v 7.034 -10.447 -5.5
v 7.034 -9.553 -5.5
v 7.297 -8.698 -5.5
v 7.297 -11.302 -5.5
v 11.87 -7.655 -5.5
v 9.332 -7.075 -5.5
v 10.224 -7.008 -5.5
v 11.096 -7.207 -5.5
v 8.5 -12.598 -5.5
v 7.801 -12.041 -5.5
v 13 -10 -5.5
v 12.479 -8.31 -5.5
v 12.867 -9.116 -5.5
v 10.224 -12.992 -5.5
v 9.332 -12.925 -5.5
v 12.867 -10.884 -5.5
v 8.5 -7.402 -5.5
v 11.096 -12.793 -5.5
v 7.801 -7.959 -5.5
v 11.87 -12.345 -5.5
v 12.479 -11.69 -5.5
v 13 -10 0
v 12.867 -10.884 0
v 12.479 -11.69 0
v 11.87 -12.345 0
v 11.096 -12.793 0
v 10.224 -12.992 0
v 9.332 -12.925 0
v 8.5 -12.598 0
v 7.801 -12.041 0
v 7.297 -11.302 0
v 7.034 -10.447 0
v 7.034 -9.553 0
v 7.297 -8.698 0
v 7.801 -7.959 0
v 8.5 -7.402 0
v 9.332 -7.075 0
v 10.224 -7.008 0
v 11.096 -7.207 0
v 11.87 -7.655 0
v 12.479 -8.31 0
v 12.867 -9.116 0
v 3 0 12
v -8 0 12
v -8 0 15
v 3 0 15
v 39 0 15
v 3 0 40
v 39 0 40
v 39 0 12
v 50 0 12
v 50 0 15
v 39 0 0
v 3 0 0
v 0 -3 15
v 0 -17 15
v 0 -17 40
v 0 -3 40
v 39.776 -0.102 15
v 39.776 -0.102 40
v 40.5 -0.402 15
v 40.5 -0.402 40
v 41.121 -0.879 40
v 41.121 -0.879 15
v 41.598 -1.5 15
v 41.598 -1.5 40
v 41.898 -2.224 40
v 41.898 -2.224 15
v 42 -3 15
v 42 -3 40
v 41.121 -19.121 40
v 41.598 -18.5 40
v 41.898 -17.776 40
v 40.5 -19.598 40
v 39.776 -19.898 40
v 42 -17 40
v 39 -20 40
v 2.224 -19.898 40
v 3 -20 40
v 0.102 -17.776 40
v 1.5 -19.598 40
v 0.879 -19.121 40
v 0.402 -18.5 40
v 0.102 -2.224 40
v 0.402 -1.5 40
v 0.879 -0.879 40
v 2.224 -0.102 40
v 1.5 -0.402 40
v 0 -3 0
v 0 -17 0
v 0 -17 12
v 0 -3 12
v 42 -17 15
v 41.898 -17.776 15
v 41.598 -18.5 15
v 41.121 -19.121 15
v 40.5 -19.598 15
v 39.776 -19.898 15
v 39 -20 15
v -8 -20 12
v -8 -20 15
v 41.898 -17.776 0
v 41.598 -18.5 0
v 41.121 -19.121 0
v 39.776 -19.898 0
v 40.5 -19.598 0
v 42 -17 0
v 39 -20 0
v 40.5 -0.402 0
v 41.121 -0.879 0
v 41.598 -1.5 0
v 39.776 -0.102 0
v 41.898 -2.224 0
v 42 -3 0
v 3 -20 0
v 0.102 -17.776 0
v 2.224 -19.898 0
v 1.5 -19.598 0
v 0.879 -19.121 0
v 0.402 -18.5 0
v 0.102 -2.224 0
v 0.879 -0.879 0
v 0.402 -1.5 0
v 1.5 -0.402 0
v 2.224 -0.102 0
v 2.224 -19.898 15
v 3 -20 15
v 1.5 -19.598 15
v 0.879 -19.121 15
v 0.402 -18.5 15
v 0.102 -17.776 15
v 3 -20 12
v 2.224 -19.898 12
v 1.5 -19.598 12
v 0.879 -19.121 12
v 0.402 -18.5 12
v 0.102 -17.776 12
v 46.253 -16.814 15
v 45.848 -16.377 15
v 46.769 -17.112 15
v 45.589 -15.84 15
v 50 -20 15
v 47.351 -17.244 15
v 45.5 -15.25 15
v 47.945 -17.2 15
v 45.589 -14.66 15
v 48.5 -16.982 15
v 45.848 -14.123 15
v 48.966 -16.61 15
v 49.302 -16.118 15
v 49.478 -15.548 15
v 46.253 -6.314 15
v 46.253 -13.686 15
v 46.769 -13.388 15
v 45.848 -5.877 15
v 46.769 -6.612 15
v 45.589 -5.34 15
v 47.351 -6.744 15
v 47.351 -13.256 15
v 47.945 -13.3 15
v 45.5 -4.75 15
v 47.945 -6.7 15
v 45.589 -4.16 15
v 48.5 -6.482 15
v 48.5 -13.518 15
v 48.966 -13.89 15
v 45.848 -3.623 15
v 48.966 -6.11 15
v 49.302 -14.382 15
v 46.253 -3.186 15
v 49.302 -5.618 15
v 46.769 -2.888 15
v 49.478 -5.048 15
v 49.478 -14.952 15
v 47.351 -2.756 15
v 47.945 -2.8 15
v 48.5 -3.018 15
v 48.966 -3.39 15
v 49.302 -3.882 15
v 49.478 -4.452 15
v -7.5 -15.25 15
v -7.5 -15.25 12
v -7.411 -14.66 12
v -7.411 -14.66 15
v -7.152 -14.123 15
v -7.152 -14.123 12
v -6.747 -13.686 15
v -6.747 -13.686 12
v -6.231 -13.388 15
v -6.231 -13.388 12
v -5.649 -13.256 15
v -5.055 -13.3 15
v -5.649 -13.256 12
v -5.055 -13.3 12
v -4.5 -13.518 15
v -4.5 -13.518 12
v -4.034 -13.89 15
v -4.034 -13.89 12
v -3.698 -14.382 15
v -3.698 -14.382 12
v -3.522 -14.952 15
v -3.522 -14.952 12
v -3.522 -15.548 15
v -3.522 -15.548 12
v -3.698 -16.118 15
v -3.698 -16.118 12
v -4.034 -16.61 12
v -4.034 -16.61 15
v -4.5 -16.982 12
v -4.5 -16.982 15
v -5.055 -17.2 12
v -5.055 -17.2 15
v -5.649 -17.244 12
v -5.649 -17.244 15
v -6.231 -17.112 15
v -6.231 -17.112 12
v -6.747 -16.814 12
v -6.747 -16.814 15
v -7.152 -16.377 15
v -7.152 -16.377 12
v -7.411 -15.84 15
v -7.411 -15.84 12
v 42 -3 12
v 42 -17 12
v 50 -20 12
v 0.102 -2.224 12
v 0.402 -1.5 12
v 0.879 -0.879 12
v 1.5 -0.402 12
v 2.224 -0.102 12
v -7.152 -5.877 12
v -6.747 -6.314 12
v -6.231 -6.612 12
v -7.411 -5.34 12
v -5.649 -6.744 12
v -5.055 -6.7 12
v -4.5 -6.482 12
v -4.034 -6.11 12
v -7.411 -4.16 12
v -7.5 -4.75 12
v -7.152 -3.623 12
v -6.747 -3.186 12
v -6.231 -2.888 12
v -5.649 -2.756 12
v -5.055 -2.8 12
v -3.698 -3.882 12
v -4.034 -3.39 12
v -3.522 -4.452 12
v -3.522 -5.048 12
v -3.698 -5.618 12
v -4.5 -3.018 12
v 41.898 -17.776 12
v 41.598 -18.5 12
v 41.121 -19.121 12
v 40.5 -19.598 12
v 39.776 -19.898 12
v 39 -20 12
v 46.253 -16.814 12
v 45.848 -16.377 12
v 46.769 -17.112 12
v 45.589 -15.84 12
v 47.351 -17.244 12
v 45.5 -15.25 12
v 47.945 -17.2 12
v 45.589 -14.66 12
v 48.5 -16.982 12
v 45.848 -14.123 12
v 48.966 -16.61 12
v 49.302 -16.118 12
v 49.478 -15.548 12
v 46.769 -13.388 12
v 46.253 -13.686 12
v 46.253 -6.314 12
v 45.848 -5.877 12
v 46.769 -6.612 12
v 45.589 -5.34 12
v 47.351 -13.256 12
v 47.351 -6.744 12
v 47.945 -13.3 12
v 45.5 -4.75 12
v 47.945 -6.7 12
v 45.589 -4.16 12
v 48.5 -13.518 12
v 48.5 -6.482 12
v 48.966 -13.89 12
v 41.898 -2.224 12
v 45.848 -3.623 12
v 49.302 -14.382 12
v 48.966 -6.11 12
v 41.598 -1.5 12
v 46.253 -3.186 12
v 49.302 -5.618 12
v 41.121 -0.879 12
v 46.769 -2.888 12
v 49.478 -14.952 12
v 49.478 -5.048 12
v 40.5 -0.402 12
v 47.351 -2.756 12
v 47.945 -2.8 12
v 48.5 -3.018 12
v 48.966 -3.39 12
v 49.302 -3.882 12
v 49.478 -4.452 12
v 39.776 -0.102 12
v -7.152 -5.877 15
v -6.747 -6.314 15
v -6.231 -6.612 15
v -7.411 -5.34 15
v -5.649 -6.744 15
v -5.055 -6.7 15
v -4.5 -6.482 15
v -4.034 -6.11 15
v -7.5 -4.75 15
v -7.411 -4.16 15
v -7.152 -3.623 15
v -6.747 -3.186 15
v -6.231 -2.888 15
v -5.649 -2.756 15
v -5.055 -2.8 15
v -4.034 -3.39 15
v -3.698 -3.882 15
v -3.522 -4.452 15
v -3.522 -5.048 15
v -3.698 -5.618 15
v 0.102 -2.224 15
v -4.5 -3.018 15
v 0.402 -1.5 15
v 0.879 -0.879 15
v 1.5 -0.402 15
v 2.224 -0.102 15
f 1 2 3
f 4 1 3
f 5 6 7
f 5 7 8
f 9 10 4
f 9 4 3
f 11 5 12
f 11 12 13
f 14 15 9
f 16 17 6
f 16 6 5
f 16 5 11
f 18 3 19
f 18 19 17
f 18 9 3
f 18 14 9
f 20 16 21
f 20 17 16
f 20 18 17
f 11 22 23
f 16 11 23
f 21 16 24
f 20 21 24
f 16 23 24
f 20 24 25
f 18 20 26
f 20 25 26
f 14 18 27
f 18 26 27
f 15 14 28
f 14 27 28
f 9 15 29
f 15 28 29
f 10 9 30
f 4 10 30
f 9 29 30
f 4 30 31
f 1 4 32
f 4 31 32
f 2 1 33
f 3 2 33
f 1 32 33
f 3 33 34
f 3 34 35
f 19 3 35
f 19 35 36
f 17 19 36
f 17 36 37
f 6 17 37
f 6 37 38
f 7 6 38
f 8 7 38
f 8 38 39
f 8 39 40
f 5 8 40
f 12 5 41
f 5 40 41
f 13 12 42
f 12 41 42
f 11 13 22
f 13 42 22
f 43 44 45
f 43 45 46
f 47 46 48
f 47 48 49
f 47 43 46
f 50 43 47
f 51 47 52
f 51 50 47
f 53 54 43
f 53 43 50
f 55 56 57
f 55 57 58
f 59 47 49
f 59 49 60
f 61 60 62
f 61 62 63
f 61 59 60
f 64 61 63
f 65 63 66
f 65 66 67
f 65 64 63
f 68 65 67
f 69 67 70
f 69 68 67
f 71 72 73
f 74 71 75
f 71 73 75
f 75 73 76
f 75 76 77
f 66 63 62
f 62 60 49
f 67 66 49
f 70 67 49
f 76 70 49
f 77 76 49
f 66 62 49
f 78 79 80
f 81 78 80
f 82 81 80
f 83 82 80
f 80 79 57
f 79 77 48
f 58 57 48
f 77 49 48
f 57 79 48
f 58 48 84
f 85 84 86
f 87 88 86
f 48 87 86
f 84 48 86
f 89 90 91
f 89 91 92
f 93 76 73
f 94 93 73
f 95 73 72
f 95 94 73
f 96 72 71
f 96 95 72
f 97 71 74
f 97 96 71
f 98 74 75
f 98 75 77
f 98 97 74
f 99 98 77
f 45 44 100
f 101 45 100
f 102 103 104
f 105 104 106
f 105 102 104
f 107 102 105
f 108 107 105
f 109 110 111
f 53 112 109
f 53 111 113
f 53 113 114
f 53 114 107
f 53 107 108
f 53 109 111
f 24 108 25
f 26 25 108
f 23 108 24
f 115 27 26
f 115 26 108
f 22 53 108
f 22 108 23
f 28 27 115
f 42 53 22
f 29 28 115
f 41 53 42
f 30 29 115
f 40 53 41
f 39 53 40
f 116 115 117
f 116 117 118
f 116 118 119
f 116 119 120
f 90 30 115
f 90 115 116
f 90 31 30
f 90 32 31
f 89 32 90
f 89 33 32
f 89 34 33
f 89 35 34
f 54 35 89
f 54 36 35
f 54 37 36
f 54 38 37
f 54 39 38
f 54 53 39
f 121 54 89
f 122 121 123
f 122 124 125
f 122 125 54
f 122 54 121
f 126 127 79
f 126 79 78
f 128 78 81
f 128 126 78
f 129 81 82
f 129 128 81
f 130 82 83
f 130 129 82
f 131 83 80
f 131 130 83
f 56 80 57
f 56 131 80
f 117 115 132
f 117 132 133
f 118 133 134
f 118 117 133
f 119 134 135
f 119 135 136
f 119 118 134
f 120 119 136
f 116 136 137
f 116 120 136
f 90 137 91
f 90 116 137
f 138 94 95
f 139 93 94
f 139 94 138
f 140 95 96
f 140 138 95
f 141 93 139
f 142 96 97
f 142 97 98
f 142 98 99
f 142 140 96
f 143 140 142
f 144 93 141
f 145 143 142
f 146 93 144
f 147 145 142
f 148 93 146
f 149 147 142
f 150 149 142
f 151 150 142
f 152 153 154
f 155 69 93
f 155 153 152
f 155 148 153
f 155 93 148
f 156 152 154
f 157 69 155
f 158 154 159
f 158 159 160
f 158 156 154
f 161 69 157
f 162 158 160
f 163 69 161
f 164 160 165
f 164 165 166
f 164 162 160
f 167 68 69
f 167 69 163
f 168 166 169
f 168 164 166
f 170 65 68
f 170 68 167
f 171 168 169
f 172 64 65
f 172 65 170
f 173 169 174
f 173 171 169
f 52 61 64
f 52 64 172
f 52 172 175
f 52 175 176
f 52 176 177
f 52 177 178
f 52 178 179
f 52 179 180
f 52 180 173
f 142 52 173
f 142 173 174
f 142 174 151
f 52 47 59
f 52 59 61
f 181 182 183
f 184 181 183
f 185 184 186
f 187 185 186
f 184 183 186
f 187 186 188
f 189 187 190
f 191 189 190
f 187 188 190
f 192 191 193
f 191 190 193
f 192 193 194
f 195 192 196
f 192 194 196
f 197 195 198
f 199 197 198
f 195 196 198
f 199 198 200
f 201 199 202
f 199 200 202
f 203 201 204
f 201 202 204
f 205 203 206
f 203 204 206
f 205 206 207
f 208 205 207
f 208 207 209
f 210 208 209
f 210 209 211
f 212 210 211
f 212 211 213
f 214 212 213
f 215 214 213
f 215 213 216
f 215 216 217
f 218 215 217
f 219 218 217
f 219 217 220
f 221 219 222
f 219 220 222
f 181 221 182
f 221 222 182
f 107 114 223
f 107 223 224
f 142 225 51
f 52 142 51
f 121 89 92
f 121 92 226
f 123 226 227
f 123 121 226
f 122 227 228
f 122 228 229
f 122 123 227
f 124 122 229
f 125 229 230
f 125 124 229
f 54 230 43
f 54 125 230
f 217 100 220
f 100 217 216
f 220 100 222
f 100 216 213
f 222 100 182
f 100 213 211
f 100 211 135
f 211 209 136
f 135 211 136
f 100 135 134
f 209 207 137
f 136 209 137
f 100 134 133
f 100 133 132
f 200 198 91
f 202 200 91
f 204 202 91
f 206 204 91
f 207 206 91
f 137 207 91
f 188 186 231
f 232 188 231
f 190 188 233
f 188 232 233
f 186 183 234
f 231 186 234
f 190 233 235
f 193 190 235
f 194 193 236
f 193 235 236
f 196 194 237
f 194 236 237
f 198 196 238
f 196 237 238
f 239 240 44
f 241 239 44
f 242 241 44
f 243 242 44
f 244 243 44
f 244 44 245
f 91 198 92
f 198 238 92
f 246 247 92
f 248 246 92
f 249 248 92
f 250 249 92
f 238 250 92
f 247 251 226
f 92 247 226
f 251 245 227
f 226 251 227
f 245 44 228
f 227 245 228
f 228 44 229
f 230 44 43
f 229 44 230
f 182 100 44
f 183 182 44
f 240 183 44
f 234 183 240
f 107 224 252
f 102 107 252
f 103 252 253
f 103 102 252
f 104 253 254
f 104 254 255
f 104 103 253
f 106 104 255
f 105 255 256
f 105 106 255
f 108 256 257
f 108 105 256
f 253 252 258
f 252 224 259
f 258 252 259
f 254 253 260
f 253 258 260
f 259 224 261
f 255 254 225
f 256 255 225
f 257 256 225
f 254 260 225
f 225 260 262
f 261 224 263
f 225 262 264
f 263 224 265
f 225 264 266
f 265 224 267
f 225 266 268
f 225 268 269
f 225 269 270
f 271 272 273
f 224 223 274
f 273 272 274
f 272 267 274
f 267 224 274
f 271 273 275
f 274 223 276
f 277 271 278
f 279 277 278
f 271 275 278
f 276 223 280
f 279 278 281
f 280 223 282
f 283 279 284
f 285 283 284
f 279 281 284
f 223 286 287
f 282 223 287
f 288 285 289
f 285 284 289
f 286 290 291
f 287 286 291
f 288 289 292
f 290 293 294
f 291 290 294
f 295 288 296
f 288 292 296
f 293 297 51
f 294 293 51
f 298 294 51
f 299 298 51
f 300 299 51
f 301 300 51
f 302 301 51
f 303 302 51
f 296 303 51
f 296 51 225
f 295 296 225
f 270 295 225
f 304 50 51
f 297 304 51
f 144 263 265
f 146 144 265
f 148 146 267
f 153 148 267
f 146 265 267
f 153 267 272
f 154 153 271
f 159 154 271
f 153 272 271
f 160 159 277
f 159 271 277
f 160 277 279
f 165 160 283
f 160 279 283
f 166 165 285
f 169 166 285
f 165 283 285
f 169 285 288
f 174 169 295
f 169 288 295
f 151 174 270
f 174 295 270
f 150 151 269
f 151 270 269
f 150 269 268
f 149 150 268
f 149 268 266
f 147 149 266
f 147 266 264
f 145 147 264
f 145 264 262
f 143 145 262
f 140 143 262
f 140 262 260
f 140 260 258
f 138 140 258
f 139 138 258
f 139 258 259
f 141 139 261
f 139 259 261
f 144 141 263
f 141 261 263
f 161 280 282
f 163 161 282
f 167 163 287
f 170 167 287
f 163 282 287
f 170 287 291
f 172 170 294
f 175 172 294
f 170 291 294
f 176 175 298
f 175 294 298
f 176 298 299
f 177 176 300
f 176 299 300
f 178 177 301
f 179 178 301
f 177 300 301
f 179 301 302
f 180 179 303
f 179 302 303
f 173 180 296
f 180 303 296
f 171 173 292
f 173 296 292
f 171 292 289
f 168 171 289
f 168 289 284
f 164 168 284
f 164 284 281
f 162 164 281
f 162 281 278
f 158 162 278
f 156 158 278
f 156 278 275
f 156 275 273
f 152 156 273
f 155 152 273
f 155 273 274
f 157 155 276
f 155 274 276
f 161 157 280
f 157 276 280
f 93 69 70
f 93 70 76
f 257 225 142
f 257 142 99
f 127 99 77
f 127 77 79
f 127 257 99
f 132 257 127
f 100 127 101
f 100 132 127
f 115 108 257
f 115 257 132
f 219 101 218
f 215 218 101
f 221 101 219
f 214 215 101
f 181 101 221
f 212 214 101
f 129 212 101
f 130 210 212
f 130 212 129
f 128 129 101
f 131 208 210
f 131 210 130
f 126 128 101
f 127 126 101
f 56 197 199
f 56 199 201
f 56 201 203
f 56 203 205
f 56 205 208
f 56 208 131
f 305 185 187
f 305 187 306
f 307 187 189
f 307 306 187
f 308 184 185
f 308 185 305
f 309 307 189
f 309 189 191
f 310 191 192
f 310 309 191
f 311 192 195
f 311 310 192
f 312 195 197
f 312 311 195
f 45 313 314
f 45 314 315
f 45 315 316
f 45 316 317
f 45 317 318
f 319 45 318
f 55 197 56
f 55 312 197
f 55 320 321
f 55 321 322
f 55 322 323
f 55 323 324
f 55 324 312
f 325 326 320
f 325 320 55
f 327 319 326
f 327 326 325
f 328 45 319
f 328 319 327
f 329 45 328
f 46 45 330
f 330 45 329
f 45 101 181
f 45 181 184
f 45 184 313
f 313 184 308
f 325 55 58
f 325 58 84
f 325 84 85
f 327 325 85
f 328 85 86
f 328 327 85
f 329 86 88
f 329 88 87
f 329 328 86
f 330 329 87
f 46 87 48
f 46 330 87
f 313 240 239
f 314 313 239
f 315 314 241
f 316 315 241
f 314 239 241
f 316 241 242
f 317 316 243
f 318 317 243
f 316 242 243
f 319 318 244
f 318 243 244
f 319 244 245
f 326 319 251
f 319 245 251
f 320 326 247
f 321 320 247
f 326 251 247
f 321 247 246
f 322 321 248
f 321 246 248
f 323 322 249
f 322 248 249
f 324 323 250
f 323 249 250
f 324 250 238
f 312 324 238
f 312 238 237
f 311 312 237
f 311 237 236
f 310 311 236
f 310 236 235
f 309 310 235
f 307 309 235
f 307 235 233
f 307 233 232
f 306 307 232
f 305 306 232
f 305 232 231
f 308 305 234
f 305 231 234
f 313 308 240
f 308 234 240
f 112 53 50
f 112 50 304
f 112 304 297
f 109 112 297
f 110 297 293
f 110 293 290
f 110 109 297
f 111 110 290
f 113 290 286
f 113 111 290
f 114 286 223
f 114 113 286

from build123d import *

# Parameters (mm, degrees)
EXTRUDE_1_DEPTH     = 40
EXTRUDE_2_DEPTH     = 3
SKETCH_4_R          = 2
CUT_EXTRUDE_1_DEPTH = 3
SKETCH_5_R          = 3
EXTRUDE_3_DEPTH     = 5.5


with BuildPart() as part:
    # 草图1 → 凸台-拉伸1 (new body)
    with BuildSketch(Plane.XY):
        with BuildLine():
            Line((3, 0), (39, 0))
            ThreePointArc((39, 0), (41.121320344, -0.878679656), (42, -3))
            Line((42, -3), (42, -17))
            ThreePointArc((42, -17), (41.121320344, -19.121320344), (39, -20))
            Line((39, -20), (3, -20))
            ThreePointArc((3, -20), (0.878679656, -19.121320344), (0, -17))
            Line((0, -17), (0, -3))
            ThreePointArc((0, -3), (0.878679656, -0.878679656), (3, 0))
        make_face()
    extrude(amount=EXTRUDE_1_DEPTH)

    # 草图3 → 凸台-拉伸2 (add)
    with BuildSketch(Plane.XY.offset(12)):
        with BuildLine():
            Line((3, 0), (-8, 0))
            Line((-8, 0), (-8, -20))
            Line((-8, -20), (3, -20))
            ThreePointArc((3, -20), (0.878679656, -19.121320344), (0, -17))
            Line((0, -17), (0, -3))
            ThreePointArc((0, -3), (0.878679656, -0.878679656), (3, 0))
        make_face()
        with BuildLine():
            Line((42, -3), (42, -17))
            ThreePointArc((42, -17), (41.121320344, -19.121320344), (39, -20))
            Line((39, -20), (50, -20))
            Line((50, -20), (50, 0))
            Line((50, 0), (39, 0))
            ThreePointArc((39, 0), (41.121320344, -0.878679656), (42, -3))
        make_face()
    extrude(amount=EXTRUDE_2_DEPTH)

    # 草图4 → 切除-拉伸1 (cut)
    with BuildSketch(Plane(origin=(0, 0, 12), x_dir=(-1, 0, 0), z_dir=(0, 0, -1))):
        with Locations((5.5, -4.75)):
            Circle(SKETCH_4_R)
        with Locations((5.5, -15.25)):
            Circle(SKETCH_4_R)
        with Locations((-47.5, -4.75)):
            Circle(SKETCH_4_R)
        with Locations((-47.5, -15.25)):
            Circle(SKETCH_4_R)
    extrude(amount=-CUT_EXTRUDE_1_DEPTH, mode=Mode.SUBTRACT)

    # 草图5 → 凸台-拉伸3 (add)
    with BuildSketch(Plane(origin=(0, 0, 0), x_dir=(-1, 0, 0), z_dir=(0, 0, -1))):
        with Locations(Location((-10, -10, 0), (0, 0, 180))):
            Circle(SKETCH_5_R)
    extrude(amount=EXTRUDE_3_DEPTH)


solid = part.part
